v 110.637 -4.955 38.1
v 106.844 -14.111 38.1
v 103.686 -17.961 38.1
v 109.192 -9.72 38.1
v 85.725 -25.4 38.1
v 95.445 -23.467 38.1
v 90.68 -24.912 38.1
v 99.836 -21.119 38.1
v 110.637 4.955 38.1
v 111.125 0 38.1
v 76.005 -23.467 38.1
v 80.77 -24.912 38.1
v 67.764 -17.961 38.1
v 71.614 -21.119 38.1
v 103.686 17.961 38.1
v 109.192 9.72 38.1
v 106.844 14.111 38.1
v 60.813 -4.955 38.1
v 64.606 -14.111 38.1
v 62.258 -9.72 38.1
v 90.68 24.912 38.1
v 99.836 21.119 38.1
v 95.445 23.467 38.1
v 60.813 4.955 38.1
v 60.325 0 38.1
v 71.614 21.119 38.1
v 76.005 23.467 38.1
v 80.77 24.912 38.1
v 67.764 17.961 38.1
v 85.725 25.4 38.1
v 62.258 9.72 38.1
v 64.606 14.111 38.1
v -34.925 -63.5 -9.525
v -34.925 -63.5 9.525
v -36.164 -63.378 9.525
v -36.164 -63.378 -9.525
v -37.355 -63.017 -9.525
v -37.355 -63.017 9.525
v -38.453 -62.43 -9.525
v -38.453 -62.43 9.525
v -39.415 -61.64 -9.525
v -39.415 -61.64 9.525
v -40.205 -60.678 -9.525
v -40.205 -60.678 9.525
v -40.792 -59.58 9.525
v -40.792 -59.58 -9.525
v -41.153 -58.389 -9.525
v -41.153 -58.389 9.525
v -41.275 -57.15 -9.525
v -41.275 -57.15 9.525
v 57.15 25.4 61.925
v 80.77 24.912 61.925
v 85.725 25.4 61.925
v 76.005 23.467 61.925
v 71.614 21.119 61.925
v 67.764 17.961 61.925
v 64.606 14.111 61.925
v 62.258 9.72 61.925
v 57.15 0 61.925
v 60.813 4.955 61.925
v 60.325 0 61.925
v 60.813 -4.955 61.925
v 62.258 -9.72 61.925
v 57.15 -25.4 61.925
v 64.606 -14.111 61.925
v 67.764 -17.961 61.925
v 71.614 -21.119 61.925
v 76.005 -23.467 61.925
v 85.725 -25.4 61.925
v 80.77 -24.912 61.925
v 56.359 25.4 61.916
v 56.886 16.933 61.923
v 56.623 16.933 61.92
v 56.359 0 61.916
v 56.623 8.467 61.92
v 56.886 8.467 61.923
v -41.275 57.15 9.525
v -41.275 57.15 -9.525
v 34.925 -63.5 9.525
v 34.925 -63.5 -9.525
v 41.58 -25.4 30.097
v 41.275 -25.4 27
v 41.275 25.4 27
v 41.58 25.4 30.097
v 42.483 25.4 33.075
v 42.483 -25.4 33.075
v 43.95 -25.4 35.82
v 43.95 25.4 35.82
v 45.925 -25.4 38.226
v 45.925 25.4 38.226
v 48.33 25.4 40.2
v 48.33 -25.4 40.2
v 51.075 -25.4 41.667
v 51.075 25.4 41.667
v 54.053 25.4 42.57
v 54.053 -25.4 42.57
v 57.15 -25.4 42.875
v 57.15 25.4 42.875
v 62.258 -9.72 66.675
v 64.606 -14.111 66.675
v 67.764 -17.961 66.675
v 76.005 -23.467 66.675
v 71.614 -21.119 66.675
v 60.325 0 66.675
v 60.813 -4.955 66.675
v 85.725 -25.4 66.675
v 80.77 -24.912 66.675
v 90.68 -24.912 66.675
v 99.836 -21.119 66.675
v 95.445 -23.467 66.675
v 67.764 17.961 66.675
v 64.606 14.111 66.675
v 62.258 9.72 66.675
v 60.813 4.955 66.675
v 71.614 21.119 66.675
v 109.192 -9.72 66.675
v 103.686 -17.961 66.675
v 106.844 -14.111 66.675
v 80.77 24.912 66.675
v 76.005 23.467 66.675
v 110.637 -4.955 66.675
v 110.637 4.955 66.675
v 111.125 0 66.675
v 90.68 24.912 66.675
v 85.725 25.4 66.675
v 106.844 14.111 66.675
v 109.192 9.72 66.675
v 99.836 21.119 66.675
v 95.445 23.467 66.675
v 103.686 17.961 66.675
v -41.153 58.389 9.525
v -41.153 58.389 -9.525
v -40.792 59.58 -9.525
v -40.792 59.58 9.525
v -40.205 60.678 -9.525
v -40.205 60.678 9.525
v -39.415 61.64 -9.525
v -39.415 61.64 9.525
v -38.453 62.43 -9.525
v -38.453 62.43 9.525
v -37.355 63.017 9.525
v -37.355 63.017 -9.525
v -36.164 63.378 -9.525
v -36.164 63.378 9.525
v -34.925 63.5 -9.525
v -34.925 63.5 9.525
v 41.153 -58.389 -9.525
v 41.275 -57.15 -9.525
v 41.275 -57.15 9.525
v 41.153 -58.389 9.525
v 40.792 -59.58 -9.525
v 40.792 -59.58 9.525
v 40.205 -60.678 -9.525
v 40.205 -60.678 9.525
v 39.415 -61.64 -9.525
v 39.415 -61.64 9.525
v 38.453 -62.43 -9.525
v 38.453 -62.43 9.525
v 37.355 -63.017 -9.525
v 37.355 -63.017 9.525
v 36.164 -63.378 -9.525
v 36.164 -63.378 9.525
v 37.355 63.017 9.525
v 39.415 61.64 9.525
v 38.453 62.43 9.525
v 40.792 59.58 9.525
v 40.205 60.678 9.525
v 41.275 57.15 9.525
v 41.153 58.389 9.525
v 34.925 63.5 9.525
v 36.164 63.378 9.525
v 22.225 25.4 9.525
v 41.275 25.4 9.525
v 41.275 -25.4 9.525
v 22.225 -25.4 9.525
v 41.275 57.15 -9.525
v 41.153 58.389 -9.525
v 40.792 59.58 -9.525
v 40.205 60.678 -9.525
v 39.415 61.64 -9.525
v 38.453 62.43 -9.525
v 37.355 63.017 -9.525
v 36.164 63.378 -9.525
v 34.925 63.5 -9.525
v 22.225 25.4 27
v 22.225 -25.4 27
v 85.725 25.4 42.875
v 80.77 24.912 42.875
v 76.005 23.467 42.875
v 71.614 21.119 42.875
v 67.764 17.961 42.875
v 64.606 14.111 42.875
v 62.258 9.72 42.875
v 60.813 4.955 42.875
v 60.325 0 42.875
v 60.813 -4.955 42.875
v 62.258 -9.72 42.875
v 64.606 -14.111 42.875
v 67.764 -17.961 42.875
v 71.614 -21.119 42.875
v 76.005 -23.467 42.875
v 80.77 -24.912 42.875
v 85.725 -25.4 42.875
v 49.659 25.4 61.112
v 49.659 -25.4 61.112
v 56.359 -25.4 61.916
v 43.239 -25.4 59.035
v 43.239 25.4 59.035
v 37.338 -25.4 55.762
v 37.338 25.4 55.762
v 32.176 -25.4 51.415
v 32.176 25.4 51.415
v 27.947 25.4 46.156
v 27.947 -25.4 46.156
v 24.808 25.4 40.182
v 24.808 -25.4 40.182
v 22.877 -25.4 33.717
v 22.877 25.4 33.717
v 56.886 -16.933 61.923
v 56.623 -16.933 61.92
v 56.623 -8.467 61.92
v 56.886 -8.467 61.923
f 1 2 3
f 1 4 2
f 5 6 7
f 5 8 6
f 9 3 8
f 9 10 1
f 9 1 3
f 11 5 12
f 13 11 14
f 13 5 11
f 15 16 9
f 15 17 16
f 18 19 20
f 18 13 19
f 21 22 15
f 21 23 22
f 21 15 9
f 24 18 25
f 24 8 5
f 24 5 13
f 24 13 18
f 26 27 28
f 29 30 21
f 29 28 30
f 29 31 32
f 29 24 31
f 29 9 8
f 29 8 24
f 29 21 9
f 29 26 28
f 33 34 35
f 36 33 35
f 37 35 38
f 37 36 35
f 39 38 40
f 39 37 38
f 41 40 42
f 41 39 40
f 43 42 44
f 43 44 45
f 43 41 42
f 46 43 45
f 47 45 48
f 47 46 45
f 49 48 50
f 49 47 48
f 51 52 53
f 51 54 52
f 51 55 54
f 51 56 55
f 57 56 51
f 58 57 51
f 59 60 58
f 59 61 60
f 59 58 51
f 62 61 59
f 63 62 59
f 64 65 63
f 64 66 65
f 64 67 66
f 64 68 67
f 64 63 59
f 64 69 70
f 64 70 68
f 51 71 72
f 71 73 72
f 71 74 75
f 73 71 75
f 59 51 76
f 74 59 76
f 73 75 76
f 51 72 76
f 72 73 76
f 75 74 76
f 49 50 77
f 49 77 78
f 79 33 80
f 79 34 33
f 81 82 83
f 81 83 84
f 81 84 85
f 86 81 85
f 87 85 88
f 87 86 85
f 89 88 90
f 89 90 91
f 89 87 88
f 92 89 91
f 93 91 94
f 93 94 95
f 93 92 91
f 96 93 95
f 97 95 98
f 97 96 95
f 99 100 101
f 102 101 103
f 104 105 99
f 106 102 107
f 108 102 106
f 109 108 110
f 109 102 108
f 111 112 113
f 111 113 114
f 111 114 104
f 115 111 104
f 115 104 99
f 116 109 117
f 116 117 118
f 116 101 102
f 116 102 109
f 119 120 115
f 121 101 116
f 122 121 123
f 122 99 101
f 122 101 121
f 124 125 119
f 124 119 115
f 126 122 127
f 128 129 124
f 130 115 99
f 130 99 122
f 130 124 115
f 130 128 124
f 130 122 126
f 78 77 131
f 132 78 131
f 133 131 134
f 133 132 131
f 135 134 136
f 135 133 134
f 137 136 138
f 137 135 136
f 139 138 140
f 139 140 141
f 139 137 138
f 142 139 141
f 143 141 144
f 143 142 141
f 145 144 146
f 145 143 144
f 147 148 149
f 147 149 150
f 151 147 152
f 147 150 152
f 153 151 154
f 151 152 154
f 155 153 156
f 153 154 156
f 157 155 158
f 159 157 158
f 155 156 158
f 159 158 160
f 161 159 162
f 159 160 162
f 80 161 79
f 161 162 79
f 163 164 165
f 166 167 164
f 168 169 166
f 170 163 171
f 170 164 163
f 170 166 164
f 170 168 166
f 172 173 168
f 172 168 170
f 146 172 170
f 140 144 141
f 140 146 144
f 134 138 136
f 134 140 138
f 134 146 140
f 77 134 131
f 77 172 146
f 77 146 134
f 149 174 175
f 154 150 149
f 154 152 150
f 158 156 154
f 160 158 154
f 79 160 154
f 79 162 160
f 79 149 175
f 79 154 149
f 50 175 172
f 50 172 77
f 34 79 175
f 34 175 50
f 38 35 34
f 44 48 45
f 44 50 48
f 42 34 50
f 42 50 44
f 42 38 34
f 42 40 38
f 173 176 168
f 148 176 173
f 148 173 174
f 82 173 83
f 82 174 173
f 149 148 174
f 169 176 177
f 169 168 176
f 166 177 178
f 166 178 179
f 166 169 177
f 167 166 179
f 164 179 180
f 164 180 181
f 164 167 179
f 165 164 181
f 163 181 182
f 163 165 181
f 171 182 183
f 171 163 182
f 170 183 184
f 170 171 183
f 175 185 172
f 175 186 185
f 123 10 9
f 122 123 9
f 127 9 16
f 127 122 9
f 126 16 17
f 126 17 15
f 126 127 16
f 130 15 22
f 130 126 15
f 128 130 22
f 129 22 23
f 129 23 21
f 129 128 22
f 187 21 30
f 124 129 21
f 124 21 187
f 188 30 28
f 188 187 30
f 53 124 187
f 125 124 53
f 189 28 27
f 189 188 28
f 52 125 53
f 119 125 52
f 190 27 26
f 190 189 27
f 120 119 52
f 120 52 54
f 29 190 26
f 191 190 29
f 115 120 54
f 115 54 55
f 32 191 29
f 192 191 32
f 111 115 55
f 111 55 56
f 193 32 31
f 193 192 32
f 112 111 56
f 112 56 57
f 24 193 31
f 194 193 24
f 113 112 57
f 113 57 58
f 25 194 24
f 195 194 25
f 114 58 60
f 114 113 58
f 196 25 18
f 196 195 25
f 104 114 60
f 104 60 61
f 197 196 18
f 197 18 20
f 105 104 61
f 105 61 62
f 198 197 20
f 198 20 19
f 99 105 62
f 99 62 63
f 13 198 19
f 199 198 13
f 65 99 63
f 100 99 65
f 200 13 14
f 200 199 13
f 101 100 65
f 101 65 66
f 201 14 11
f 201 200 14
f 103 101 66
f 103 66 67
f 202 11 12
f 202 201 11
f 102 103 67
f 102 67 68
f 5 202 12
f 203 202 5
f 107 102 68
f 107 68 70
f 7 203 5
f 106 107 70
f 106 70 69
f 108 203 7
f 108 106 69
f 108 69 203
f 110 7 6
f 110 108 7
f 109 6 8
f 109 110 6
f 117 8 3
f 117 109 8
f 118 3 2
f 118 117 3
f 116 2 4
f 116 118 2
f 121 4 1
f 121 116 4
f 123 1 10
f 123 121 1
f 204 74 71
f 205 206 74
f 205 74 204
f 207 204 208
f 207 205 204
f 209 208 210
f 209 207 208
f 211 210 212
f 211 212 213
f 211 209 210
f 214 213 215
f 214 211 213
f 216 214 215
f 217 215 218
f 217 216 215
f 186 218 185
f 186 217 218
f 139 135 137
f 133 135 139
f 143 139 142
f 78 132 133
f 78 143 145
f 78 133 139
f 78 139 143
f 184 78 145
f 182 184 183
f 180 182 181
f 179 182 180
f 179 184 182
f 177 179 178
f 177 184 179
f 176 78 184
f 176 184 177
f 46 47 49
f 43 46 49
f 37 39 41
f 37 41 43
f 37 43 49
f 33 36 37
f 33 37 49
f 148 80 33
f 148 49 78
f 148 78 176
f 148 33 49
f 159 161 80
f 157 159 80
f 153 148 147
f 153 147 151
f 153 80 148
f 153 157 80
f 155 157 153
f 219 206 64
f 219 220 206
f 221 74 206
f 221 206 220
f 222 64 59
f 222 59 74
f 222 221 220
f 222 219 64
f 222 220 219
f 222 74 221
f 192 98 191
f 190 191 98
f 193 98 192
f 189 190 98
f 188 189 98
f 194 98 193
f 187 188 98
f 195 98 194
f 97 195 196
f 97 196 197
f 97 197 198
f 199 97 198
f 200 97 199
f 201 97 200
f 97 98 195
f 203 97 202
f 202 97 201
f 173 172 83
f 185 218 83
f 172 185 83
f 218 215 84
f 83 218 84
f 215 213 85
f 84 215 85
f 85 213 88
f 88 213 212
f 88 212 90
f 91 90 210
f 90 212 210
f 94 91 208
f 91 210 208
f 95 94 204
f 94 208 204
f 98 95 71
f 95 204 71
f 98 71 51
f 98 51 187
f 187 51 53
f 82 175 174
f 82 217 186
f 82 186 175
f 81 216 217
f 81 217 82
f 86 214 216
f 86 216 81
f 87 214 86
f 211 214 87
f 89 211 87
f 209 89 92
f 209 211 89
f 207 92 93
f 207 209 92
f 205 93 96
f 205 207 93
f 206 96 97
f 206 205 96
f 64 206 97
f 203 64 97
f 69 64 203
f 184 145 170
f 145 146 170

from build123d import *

# Parameters (mm, degrees)
F1_DEPTH = 63.5
F0_W     = 25.4
F0_H     = 19.05
F2_DEPTH = 25.4
F4_R     = 6.35


with BuildPart() as f1:
    # F0 (on Front) → F1 (new body, symmetric)
    with BuildSketch(Plane.XZ):
        Polygon((-41.275, -9.525), (41.275, -9.525), (41.275, 9.525), (22.225, 9.525), (-41.275, 9.525), align=None)
    extrude(amount=F1_DEPTH, both=True)

    # F0 (on Front) → F2 (join, symmetric)
    with BuildSketch(Plane.XZ):
        with BuildLine():
            Line((22.225, 9.525), (41.275, 9.525))
            Line((41.275, 9.525), (41.275, 27.0002))
            ThreePointArc((41.275, 27.0002), (45.9246798487, 38.2255201513), (57.15, 42.8752))
            Line((57.15, 42.8752), (60.325, 42.8752))
            Line((60.325, 42.8752), (60.325, 61.9252))
            Line((60.325, 61.9252), (57.15, 61.9252))
            add(Edge.make_bspline(
                [(56.3590284094, 61.916242), (56.6228100042, 61.9198399191), (56.8864704365, 61.9228263572), (57.15, 61.9252)],
                knots=[110.8800501916, 110.8800501916, 110.8800501916, 110.8800501916, 111.5045361635, 111.5045361635, 111.5045361635, 111.5045361635], degree=3))
            ThreePointArc((56.3590284094, 61.916242), (32.176210662, 51.414652095), (22.225, 27.0002))
            Line((22.225, 27.0002), (22.225, 9.525))
        make_face()
        with Locations((73.025, 52.4002)):
            Rectangle(F0_W, F0_H)
    extrude(amount=F2_DEPTH, both=True)

    # F0 (on Front) → F3 (revolve)
    with BuildSketch(Plane.XZ):
        Polygon((85.725, 61.9252), (85.725, 42.8752), (85.725, 38.1), (111.125, 38.1), (111.125, 66.675), (85.725, 66.675), align=None)
    revolve(axis=Axis((85.725, 0, 52.3875), (0, 0, 1)))

    # F4
    f4_edges = [f1.edges().sort_by_distance(p)[0] for p in [
        (41.275, -63.5, 0),
        (-41.275, -63.5, 0),
        (-41.275, 63.5, 0),
        (41.275, 63.5, 0),
    ]]
    fillet(f4_edges, radius=F4_R)


solid = f1.part
